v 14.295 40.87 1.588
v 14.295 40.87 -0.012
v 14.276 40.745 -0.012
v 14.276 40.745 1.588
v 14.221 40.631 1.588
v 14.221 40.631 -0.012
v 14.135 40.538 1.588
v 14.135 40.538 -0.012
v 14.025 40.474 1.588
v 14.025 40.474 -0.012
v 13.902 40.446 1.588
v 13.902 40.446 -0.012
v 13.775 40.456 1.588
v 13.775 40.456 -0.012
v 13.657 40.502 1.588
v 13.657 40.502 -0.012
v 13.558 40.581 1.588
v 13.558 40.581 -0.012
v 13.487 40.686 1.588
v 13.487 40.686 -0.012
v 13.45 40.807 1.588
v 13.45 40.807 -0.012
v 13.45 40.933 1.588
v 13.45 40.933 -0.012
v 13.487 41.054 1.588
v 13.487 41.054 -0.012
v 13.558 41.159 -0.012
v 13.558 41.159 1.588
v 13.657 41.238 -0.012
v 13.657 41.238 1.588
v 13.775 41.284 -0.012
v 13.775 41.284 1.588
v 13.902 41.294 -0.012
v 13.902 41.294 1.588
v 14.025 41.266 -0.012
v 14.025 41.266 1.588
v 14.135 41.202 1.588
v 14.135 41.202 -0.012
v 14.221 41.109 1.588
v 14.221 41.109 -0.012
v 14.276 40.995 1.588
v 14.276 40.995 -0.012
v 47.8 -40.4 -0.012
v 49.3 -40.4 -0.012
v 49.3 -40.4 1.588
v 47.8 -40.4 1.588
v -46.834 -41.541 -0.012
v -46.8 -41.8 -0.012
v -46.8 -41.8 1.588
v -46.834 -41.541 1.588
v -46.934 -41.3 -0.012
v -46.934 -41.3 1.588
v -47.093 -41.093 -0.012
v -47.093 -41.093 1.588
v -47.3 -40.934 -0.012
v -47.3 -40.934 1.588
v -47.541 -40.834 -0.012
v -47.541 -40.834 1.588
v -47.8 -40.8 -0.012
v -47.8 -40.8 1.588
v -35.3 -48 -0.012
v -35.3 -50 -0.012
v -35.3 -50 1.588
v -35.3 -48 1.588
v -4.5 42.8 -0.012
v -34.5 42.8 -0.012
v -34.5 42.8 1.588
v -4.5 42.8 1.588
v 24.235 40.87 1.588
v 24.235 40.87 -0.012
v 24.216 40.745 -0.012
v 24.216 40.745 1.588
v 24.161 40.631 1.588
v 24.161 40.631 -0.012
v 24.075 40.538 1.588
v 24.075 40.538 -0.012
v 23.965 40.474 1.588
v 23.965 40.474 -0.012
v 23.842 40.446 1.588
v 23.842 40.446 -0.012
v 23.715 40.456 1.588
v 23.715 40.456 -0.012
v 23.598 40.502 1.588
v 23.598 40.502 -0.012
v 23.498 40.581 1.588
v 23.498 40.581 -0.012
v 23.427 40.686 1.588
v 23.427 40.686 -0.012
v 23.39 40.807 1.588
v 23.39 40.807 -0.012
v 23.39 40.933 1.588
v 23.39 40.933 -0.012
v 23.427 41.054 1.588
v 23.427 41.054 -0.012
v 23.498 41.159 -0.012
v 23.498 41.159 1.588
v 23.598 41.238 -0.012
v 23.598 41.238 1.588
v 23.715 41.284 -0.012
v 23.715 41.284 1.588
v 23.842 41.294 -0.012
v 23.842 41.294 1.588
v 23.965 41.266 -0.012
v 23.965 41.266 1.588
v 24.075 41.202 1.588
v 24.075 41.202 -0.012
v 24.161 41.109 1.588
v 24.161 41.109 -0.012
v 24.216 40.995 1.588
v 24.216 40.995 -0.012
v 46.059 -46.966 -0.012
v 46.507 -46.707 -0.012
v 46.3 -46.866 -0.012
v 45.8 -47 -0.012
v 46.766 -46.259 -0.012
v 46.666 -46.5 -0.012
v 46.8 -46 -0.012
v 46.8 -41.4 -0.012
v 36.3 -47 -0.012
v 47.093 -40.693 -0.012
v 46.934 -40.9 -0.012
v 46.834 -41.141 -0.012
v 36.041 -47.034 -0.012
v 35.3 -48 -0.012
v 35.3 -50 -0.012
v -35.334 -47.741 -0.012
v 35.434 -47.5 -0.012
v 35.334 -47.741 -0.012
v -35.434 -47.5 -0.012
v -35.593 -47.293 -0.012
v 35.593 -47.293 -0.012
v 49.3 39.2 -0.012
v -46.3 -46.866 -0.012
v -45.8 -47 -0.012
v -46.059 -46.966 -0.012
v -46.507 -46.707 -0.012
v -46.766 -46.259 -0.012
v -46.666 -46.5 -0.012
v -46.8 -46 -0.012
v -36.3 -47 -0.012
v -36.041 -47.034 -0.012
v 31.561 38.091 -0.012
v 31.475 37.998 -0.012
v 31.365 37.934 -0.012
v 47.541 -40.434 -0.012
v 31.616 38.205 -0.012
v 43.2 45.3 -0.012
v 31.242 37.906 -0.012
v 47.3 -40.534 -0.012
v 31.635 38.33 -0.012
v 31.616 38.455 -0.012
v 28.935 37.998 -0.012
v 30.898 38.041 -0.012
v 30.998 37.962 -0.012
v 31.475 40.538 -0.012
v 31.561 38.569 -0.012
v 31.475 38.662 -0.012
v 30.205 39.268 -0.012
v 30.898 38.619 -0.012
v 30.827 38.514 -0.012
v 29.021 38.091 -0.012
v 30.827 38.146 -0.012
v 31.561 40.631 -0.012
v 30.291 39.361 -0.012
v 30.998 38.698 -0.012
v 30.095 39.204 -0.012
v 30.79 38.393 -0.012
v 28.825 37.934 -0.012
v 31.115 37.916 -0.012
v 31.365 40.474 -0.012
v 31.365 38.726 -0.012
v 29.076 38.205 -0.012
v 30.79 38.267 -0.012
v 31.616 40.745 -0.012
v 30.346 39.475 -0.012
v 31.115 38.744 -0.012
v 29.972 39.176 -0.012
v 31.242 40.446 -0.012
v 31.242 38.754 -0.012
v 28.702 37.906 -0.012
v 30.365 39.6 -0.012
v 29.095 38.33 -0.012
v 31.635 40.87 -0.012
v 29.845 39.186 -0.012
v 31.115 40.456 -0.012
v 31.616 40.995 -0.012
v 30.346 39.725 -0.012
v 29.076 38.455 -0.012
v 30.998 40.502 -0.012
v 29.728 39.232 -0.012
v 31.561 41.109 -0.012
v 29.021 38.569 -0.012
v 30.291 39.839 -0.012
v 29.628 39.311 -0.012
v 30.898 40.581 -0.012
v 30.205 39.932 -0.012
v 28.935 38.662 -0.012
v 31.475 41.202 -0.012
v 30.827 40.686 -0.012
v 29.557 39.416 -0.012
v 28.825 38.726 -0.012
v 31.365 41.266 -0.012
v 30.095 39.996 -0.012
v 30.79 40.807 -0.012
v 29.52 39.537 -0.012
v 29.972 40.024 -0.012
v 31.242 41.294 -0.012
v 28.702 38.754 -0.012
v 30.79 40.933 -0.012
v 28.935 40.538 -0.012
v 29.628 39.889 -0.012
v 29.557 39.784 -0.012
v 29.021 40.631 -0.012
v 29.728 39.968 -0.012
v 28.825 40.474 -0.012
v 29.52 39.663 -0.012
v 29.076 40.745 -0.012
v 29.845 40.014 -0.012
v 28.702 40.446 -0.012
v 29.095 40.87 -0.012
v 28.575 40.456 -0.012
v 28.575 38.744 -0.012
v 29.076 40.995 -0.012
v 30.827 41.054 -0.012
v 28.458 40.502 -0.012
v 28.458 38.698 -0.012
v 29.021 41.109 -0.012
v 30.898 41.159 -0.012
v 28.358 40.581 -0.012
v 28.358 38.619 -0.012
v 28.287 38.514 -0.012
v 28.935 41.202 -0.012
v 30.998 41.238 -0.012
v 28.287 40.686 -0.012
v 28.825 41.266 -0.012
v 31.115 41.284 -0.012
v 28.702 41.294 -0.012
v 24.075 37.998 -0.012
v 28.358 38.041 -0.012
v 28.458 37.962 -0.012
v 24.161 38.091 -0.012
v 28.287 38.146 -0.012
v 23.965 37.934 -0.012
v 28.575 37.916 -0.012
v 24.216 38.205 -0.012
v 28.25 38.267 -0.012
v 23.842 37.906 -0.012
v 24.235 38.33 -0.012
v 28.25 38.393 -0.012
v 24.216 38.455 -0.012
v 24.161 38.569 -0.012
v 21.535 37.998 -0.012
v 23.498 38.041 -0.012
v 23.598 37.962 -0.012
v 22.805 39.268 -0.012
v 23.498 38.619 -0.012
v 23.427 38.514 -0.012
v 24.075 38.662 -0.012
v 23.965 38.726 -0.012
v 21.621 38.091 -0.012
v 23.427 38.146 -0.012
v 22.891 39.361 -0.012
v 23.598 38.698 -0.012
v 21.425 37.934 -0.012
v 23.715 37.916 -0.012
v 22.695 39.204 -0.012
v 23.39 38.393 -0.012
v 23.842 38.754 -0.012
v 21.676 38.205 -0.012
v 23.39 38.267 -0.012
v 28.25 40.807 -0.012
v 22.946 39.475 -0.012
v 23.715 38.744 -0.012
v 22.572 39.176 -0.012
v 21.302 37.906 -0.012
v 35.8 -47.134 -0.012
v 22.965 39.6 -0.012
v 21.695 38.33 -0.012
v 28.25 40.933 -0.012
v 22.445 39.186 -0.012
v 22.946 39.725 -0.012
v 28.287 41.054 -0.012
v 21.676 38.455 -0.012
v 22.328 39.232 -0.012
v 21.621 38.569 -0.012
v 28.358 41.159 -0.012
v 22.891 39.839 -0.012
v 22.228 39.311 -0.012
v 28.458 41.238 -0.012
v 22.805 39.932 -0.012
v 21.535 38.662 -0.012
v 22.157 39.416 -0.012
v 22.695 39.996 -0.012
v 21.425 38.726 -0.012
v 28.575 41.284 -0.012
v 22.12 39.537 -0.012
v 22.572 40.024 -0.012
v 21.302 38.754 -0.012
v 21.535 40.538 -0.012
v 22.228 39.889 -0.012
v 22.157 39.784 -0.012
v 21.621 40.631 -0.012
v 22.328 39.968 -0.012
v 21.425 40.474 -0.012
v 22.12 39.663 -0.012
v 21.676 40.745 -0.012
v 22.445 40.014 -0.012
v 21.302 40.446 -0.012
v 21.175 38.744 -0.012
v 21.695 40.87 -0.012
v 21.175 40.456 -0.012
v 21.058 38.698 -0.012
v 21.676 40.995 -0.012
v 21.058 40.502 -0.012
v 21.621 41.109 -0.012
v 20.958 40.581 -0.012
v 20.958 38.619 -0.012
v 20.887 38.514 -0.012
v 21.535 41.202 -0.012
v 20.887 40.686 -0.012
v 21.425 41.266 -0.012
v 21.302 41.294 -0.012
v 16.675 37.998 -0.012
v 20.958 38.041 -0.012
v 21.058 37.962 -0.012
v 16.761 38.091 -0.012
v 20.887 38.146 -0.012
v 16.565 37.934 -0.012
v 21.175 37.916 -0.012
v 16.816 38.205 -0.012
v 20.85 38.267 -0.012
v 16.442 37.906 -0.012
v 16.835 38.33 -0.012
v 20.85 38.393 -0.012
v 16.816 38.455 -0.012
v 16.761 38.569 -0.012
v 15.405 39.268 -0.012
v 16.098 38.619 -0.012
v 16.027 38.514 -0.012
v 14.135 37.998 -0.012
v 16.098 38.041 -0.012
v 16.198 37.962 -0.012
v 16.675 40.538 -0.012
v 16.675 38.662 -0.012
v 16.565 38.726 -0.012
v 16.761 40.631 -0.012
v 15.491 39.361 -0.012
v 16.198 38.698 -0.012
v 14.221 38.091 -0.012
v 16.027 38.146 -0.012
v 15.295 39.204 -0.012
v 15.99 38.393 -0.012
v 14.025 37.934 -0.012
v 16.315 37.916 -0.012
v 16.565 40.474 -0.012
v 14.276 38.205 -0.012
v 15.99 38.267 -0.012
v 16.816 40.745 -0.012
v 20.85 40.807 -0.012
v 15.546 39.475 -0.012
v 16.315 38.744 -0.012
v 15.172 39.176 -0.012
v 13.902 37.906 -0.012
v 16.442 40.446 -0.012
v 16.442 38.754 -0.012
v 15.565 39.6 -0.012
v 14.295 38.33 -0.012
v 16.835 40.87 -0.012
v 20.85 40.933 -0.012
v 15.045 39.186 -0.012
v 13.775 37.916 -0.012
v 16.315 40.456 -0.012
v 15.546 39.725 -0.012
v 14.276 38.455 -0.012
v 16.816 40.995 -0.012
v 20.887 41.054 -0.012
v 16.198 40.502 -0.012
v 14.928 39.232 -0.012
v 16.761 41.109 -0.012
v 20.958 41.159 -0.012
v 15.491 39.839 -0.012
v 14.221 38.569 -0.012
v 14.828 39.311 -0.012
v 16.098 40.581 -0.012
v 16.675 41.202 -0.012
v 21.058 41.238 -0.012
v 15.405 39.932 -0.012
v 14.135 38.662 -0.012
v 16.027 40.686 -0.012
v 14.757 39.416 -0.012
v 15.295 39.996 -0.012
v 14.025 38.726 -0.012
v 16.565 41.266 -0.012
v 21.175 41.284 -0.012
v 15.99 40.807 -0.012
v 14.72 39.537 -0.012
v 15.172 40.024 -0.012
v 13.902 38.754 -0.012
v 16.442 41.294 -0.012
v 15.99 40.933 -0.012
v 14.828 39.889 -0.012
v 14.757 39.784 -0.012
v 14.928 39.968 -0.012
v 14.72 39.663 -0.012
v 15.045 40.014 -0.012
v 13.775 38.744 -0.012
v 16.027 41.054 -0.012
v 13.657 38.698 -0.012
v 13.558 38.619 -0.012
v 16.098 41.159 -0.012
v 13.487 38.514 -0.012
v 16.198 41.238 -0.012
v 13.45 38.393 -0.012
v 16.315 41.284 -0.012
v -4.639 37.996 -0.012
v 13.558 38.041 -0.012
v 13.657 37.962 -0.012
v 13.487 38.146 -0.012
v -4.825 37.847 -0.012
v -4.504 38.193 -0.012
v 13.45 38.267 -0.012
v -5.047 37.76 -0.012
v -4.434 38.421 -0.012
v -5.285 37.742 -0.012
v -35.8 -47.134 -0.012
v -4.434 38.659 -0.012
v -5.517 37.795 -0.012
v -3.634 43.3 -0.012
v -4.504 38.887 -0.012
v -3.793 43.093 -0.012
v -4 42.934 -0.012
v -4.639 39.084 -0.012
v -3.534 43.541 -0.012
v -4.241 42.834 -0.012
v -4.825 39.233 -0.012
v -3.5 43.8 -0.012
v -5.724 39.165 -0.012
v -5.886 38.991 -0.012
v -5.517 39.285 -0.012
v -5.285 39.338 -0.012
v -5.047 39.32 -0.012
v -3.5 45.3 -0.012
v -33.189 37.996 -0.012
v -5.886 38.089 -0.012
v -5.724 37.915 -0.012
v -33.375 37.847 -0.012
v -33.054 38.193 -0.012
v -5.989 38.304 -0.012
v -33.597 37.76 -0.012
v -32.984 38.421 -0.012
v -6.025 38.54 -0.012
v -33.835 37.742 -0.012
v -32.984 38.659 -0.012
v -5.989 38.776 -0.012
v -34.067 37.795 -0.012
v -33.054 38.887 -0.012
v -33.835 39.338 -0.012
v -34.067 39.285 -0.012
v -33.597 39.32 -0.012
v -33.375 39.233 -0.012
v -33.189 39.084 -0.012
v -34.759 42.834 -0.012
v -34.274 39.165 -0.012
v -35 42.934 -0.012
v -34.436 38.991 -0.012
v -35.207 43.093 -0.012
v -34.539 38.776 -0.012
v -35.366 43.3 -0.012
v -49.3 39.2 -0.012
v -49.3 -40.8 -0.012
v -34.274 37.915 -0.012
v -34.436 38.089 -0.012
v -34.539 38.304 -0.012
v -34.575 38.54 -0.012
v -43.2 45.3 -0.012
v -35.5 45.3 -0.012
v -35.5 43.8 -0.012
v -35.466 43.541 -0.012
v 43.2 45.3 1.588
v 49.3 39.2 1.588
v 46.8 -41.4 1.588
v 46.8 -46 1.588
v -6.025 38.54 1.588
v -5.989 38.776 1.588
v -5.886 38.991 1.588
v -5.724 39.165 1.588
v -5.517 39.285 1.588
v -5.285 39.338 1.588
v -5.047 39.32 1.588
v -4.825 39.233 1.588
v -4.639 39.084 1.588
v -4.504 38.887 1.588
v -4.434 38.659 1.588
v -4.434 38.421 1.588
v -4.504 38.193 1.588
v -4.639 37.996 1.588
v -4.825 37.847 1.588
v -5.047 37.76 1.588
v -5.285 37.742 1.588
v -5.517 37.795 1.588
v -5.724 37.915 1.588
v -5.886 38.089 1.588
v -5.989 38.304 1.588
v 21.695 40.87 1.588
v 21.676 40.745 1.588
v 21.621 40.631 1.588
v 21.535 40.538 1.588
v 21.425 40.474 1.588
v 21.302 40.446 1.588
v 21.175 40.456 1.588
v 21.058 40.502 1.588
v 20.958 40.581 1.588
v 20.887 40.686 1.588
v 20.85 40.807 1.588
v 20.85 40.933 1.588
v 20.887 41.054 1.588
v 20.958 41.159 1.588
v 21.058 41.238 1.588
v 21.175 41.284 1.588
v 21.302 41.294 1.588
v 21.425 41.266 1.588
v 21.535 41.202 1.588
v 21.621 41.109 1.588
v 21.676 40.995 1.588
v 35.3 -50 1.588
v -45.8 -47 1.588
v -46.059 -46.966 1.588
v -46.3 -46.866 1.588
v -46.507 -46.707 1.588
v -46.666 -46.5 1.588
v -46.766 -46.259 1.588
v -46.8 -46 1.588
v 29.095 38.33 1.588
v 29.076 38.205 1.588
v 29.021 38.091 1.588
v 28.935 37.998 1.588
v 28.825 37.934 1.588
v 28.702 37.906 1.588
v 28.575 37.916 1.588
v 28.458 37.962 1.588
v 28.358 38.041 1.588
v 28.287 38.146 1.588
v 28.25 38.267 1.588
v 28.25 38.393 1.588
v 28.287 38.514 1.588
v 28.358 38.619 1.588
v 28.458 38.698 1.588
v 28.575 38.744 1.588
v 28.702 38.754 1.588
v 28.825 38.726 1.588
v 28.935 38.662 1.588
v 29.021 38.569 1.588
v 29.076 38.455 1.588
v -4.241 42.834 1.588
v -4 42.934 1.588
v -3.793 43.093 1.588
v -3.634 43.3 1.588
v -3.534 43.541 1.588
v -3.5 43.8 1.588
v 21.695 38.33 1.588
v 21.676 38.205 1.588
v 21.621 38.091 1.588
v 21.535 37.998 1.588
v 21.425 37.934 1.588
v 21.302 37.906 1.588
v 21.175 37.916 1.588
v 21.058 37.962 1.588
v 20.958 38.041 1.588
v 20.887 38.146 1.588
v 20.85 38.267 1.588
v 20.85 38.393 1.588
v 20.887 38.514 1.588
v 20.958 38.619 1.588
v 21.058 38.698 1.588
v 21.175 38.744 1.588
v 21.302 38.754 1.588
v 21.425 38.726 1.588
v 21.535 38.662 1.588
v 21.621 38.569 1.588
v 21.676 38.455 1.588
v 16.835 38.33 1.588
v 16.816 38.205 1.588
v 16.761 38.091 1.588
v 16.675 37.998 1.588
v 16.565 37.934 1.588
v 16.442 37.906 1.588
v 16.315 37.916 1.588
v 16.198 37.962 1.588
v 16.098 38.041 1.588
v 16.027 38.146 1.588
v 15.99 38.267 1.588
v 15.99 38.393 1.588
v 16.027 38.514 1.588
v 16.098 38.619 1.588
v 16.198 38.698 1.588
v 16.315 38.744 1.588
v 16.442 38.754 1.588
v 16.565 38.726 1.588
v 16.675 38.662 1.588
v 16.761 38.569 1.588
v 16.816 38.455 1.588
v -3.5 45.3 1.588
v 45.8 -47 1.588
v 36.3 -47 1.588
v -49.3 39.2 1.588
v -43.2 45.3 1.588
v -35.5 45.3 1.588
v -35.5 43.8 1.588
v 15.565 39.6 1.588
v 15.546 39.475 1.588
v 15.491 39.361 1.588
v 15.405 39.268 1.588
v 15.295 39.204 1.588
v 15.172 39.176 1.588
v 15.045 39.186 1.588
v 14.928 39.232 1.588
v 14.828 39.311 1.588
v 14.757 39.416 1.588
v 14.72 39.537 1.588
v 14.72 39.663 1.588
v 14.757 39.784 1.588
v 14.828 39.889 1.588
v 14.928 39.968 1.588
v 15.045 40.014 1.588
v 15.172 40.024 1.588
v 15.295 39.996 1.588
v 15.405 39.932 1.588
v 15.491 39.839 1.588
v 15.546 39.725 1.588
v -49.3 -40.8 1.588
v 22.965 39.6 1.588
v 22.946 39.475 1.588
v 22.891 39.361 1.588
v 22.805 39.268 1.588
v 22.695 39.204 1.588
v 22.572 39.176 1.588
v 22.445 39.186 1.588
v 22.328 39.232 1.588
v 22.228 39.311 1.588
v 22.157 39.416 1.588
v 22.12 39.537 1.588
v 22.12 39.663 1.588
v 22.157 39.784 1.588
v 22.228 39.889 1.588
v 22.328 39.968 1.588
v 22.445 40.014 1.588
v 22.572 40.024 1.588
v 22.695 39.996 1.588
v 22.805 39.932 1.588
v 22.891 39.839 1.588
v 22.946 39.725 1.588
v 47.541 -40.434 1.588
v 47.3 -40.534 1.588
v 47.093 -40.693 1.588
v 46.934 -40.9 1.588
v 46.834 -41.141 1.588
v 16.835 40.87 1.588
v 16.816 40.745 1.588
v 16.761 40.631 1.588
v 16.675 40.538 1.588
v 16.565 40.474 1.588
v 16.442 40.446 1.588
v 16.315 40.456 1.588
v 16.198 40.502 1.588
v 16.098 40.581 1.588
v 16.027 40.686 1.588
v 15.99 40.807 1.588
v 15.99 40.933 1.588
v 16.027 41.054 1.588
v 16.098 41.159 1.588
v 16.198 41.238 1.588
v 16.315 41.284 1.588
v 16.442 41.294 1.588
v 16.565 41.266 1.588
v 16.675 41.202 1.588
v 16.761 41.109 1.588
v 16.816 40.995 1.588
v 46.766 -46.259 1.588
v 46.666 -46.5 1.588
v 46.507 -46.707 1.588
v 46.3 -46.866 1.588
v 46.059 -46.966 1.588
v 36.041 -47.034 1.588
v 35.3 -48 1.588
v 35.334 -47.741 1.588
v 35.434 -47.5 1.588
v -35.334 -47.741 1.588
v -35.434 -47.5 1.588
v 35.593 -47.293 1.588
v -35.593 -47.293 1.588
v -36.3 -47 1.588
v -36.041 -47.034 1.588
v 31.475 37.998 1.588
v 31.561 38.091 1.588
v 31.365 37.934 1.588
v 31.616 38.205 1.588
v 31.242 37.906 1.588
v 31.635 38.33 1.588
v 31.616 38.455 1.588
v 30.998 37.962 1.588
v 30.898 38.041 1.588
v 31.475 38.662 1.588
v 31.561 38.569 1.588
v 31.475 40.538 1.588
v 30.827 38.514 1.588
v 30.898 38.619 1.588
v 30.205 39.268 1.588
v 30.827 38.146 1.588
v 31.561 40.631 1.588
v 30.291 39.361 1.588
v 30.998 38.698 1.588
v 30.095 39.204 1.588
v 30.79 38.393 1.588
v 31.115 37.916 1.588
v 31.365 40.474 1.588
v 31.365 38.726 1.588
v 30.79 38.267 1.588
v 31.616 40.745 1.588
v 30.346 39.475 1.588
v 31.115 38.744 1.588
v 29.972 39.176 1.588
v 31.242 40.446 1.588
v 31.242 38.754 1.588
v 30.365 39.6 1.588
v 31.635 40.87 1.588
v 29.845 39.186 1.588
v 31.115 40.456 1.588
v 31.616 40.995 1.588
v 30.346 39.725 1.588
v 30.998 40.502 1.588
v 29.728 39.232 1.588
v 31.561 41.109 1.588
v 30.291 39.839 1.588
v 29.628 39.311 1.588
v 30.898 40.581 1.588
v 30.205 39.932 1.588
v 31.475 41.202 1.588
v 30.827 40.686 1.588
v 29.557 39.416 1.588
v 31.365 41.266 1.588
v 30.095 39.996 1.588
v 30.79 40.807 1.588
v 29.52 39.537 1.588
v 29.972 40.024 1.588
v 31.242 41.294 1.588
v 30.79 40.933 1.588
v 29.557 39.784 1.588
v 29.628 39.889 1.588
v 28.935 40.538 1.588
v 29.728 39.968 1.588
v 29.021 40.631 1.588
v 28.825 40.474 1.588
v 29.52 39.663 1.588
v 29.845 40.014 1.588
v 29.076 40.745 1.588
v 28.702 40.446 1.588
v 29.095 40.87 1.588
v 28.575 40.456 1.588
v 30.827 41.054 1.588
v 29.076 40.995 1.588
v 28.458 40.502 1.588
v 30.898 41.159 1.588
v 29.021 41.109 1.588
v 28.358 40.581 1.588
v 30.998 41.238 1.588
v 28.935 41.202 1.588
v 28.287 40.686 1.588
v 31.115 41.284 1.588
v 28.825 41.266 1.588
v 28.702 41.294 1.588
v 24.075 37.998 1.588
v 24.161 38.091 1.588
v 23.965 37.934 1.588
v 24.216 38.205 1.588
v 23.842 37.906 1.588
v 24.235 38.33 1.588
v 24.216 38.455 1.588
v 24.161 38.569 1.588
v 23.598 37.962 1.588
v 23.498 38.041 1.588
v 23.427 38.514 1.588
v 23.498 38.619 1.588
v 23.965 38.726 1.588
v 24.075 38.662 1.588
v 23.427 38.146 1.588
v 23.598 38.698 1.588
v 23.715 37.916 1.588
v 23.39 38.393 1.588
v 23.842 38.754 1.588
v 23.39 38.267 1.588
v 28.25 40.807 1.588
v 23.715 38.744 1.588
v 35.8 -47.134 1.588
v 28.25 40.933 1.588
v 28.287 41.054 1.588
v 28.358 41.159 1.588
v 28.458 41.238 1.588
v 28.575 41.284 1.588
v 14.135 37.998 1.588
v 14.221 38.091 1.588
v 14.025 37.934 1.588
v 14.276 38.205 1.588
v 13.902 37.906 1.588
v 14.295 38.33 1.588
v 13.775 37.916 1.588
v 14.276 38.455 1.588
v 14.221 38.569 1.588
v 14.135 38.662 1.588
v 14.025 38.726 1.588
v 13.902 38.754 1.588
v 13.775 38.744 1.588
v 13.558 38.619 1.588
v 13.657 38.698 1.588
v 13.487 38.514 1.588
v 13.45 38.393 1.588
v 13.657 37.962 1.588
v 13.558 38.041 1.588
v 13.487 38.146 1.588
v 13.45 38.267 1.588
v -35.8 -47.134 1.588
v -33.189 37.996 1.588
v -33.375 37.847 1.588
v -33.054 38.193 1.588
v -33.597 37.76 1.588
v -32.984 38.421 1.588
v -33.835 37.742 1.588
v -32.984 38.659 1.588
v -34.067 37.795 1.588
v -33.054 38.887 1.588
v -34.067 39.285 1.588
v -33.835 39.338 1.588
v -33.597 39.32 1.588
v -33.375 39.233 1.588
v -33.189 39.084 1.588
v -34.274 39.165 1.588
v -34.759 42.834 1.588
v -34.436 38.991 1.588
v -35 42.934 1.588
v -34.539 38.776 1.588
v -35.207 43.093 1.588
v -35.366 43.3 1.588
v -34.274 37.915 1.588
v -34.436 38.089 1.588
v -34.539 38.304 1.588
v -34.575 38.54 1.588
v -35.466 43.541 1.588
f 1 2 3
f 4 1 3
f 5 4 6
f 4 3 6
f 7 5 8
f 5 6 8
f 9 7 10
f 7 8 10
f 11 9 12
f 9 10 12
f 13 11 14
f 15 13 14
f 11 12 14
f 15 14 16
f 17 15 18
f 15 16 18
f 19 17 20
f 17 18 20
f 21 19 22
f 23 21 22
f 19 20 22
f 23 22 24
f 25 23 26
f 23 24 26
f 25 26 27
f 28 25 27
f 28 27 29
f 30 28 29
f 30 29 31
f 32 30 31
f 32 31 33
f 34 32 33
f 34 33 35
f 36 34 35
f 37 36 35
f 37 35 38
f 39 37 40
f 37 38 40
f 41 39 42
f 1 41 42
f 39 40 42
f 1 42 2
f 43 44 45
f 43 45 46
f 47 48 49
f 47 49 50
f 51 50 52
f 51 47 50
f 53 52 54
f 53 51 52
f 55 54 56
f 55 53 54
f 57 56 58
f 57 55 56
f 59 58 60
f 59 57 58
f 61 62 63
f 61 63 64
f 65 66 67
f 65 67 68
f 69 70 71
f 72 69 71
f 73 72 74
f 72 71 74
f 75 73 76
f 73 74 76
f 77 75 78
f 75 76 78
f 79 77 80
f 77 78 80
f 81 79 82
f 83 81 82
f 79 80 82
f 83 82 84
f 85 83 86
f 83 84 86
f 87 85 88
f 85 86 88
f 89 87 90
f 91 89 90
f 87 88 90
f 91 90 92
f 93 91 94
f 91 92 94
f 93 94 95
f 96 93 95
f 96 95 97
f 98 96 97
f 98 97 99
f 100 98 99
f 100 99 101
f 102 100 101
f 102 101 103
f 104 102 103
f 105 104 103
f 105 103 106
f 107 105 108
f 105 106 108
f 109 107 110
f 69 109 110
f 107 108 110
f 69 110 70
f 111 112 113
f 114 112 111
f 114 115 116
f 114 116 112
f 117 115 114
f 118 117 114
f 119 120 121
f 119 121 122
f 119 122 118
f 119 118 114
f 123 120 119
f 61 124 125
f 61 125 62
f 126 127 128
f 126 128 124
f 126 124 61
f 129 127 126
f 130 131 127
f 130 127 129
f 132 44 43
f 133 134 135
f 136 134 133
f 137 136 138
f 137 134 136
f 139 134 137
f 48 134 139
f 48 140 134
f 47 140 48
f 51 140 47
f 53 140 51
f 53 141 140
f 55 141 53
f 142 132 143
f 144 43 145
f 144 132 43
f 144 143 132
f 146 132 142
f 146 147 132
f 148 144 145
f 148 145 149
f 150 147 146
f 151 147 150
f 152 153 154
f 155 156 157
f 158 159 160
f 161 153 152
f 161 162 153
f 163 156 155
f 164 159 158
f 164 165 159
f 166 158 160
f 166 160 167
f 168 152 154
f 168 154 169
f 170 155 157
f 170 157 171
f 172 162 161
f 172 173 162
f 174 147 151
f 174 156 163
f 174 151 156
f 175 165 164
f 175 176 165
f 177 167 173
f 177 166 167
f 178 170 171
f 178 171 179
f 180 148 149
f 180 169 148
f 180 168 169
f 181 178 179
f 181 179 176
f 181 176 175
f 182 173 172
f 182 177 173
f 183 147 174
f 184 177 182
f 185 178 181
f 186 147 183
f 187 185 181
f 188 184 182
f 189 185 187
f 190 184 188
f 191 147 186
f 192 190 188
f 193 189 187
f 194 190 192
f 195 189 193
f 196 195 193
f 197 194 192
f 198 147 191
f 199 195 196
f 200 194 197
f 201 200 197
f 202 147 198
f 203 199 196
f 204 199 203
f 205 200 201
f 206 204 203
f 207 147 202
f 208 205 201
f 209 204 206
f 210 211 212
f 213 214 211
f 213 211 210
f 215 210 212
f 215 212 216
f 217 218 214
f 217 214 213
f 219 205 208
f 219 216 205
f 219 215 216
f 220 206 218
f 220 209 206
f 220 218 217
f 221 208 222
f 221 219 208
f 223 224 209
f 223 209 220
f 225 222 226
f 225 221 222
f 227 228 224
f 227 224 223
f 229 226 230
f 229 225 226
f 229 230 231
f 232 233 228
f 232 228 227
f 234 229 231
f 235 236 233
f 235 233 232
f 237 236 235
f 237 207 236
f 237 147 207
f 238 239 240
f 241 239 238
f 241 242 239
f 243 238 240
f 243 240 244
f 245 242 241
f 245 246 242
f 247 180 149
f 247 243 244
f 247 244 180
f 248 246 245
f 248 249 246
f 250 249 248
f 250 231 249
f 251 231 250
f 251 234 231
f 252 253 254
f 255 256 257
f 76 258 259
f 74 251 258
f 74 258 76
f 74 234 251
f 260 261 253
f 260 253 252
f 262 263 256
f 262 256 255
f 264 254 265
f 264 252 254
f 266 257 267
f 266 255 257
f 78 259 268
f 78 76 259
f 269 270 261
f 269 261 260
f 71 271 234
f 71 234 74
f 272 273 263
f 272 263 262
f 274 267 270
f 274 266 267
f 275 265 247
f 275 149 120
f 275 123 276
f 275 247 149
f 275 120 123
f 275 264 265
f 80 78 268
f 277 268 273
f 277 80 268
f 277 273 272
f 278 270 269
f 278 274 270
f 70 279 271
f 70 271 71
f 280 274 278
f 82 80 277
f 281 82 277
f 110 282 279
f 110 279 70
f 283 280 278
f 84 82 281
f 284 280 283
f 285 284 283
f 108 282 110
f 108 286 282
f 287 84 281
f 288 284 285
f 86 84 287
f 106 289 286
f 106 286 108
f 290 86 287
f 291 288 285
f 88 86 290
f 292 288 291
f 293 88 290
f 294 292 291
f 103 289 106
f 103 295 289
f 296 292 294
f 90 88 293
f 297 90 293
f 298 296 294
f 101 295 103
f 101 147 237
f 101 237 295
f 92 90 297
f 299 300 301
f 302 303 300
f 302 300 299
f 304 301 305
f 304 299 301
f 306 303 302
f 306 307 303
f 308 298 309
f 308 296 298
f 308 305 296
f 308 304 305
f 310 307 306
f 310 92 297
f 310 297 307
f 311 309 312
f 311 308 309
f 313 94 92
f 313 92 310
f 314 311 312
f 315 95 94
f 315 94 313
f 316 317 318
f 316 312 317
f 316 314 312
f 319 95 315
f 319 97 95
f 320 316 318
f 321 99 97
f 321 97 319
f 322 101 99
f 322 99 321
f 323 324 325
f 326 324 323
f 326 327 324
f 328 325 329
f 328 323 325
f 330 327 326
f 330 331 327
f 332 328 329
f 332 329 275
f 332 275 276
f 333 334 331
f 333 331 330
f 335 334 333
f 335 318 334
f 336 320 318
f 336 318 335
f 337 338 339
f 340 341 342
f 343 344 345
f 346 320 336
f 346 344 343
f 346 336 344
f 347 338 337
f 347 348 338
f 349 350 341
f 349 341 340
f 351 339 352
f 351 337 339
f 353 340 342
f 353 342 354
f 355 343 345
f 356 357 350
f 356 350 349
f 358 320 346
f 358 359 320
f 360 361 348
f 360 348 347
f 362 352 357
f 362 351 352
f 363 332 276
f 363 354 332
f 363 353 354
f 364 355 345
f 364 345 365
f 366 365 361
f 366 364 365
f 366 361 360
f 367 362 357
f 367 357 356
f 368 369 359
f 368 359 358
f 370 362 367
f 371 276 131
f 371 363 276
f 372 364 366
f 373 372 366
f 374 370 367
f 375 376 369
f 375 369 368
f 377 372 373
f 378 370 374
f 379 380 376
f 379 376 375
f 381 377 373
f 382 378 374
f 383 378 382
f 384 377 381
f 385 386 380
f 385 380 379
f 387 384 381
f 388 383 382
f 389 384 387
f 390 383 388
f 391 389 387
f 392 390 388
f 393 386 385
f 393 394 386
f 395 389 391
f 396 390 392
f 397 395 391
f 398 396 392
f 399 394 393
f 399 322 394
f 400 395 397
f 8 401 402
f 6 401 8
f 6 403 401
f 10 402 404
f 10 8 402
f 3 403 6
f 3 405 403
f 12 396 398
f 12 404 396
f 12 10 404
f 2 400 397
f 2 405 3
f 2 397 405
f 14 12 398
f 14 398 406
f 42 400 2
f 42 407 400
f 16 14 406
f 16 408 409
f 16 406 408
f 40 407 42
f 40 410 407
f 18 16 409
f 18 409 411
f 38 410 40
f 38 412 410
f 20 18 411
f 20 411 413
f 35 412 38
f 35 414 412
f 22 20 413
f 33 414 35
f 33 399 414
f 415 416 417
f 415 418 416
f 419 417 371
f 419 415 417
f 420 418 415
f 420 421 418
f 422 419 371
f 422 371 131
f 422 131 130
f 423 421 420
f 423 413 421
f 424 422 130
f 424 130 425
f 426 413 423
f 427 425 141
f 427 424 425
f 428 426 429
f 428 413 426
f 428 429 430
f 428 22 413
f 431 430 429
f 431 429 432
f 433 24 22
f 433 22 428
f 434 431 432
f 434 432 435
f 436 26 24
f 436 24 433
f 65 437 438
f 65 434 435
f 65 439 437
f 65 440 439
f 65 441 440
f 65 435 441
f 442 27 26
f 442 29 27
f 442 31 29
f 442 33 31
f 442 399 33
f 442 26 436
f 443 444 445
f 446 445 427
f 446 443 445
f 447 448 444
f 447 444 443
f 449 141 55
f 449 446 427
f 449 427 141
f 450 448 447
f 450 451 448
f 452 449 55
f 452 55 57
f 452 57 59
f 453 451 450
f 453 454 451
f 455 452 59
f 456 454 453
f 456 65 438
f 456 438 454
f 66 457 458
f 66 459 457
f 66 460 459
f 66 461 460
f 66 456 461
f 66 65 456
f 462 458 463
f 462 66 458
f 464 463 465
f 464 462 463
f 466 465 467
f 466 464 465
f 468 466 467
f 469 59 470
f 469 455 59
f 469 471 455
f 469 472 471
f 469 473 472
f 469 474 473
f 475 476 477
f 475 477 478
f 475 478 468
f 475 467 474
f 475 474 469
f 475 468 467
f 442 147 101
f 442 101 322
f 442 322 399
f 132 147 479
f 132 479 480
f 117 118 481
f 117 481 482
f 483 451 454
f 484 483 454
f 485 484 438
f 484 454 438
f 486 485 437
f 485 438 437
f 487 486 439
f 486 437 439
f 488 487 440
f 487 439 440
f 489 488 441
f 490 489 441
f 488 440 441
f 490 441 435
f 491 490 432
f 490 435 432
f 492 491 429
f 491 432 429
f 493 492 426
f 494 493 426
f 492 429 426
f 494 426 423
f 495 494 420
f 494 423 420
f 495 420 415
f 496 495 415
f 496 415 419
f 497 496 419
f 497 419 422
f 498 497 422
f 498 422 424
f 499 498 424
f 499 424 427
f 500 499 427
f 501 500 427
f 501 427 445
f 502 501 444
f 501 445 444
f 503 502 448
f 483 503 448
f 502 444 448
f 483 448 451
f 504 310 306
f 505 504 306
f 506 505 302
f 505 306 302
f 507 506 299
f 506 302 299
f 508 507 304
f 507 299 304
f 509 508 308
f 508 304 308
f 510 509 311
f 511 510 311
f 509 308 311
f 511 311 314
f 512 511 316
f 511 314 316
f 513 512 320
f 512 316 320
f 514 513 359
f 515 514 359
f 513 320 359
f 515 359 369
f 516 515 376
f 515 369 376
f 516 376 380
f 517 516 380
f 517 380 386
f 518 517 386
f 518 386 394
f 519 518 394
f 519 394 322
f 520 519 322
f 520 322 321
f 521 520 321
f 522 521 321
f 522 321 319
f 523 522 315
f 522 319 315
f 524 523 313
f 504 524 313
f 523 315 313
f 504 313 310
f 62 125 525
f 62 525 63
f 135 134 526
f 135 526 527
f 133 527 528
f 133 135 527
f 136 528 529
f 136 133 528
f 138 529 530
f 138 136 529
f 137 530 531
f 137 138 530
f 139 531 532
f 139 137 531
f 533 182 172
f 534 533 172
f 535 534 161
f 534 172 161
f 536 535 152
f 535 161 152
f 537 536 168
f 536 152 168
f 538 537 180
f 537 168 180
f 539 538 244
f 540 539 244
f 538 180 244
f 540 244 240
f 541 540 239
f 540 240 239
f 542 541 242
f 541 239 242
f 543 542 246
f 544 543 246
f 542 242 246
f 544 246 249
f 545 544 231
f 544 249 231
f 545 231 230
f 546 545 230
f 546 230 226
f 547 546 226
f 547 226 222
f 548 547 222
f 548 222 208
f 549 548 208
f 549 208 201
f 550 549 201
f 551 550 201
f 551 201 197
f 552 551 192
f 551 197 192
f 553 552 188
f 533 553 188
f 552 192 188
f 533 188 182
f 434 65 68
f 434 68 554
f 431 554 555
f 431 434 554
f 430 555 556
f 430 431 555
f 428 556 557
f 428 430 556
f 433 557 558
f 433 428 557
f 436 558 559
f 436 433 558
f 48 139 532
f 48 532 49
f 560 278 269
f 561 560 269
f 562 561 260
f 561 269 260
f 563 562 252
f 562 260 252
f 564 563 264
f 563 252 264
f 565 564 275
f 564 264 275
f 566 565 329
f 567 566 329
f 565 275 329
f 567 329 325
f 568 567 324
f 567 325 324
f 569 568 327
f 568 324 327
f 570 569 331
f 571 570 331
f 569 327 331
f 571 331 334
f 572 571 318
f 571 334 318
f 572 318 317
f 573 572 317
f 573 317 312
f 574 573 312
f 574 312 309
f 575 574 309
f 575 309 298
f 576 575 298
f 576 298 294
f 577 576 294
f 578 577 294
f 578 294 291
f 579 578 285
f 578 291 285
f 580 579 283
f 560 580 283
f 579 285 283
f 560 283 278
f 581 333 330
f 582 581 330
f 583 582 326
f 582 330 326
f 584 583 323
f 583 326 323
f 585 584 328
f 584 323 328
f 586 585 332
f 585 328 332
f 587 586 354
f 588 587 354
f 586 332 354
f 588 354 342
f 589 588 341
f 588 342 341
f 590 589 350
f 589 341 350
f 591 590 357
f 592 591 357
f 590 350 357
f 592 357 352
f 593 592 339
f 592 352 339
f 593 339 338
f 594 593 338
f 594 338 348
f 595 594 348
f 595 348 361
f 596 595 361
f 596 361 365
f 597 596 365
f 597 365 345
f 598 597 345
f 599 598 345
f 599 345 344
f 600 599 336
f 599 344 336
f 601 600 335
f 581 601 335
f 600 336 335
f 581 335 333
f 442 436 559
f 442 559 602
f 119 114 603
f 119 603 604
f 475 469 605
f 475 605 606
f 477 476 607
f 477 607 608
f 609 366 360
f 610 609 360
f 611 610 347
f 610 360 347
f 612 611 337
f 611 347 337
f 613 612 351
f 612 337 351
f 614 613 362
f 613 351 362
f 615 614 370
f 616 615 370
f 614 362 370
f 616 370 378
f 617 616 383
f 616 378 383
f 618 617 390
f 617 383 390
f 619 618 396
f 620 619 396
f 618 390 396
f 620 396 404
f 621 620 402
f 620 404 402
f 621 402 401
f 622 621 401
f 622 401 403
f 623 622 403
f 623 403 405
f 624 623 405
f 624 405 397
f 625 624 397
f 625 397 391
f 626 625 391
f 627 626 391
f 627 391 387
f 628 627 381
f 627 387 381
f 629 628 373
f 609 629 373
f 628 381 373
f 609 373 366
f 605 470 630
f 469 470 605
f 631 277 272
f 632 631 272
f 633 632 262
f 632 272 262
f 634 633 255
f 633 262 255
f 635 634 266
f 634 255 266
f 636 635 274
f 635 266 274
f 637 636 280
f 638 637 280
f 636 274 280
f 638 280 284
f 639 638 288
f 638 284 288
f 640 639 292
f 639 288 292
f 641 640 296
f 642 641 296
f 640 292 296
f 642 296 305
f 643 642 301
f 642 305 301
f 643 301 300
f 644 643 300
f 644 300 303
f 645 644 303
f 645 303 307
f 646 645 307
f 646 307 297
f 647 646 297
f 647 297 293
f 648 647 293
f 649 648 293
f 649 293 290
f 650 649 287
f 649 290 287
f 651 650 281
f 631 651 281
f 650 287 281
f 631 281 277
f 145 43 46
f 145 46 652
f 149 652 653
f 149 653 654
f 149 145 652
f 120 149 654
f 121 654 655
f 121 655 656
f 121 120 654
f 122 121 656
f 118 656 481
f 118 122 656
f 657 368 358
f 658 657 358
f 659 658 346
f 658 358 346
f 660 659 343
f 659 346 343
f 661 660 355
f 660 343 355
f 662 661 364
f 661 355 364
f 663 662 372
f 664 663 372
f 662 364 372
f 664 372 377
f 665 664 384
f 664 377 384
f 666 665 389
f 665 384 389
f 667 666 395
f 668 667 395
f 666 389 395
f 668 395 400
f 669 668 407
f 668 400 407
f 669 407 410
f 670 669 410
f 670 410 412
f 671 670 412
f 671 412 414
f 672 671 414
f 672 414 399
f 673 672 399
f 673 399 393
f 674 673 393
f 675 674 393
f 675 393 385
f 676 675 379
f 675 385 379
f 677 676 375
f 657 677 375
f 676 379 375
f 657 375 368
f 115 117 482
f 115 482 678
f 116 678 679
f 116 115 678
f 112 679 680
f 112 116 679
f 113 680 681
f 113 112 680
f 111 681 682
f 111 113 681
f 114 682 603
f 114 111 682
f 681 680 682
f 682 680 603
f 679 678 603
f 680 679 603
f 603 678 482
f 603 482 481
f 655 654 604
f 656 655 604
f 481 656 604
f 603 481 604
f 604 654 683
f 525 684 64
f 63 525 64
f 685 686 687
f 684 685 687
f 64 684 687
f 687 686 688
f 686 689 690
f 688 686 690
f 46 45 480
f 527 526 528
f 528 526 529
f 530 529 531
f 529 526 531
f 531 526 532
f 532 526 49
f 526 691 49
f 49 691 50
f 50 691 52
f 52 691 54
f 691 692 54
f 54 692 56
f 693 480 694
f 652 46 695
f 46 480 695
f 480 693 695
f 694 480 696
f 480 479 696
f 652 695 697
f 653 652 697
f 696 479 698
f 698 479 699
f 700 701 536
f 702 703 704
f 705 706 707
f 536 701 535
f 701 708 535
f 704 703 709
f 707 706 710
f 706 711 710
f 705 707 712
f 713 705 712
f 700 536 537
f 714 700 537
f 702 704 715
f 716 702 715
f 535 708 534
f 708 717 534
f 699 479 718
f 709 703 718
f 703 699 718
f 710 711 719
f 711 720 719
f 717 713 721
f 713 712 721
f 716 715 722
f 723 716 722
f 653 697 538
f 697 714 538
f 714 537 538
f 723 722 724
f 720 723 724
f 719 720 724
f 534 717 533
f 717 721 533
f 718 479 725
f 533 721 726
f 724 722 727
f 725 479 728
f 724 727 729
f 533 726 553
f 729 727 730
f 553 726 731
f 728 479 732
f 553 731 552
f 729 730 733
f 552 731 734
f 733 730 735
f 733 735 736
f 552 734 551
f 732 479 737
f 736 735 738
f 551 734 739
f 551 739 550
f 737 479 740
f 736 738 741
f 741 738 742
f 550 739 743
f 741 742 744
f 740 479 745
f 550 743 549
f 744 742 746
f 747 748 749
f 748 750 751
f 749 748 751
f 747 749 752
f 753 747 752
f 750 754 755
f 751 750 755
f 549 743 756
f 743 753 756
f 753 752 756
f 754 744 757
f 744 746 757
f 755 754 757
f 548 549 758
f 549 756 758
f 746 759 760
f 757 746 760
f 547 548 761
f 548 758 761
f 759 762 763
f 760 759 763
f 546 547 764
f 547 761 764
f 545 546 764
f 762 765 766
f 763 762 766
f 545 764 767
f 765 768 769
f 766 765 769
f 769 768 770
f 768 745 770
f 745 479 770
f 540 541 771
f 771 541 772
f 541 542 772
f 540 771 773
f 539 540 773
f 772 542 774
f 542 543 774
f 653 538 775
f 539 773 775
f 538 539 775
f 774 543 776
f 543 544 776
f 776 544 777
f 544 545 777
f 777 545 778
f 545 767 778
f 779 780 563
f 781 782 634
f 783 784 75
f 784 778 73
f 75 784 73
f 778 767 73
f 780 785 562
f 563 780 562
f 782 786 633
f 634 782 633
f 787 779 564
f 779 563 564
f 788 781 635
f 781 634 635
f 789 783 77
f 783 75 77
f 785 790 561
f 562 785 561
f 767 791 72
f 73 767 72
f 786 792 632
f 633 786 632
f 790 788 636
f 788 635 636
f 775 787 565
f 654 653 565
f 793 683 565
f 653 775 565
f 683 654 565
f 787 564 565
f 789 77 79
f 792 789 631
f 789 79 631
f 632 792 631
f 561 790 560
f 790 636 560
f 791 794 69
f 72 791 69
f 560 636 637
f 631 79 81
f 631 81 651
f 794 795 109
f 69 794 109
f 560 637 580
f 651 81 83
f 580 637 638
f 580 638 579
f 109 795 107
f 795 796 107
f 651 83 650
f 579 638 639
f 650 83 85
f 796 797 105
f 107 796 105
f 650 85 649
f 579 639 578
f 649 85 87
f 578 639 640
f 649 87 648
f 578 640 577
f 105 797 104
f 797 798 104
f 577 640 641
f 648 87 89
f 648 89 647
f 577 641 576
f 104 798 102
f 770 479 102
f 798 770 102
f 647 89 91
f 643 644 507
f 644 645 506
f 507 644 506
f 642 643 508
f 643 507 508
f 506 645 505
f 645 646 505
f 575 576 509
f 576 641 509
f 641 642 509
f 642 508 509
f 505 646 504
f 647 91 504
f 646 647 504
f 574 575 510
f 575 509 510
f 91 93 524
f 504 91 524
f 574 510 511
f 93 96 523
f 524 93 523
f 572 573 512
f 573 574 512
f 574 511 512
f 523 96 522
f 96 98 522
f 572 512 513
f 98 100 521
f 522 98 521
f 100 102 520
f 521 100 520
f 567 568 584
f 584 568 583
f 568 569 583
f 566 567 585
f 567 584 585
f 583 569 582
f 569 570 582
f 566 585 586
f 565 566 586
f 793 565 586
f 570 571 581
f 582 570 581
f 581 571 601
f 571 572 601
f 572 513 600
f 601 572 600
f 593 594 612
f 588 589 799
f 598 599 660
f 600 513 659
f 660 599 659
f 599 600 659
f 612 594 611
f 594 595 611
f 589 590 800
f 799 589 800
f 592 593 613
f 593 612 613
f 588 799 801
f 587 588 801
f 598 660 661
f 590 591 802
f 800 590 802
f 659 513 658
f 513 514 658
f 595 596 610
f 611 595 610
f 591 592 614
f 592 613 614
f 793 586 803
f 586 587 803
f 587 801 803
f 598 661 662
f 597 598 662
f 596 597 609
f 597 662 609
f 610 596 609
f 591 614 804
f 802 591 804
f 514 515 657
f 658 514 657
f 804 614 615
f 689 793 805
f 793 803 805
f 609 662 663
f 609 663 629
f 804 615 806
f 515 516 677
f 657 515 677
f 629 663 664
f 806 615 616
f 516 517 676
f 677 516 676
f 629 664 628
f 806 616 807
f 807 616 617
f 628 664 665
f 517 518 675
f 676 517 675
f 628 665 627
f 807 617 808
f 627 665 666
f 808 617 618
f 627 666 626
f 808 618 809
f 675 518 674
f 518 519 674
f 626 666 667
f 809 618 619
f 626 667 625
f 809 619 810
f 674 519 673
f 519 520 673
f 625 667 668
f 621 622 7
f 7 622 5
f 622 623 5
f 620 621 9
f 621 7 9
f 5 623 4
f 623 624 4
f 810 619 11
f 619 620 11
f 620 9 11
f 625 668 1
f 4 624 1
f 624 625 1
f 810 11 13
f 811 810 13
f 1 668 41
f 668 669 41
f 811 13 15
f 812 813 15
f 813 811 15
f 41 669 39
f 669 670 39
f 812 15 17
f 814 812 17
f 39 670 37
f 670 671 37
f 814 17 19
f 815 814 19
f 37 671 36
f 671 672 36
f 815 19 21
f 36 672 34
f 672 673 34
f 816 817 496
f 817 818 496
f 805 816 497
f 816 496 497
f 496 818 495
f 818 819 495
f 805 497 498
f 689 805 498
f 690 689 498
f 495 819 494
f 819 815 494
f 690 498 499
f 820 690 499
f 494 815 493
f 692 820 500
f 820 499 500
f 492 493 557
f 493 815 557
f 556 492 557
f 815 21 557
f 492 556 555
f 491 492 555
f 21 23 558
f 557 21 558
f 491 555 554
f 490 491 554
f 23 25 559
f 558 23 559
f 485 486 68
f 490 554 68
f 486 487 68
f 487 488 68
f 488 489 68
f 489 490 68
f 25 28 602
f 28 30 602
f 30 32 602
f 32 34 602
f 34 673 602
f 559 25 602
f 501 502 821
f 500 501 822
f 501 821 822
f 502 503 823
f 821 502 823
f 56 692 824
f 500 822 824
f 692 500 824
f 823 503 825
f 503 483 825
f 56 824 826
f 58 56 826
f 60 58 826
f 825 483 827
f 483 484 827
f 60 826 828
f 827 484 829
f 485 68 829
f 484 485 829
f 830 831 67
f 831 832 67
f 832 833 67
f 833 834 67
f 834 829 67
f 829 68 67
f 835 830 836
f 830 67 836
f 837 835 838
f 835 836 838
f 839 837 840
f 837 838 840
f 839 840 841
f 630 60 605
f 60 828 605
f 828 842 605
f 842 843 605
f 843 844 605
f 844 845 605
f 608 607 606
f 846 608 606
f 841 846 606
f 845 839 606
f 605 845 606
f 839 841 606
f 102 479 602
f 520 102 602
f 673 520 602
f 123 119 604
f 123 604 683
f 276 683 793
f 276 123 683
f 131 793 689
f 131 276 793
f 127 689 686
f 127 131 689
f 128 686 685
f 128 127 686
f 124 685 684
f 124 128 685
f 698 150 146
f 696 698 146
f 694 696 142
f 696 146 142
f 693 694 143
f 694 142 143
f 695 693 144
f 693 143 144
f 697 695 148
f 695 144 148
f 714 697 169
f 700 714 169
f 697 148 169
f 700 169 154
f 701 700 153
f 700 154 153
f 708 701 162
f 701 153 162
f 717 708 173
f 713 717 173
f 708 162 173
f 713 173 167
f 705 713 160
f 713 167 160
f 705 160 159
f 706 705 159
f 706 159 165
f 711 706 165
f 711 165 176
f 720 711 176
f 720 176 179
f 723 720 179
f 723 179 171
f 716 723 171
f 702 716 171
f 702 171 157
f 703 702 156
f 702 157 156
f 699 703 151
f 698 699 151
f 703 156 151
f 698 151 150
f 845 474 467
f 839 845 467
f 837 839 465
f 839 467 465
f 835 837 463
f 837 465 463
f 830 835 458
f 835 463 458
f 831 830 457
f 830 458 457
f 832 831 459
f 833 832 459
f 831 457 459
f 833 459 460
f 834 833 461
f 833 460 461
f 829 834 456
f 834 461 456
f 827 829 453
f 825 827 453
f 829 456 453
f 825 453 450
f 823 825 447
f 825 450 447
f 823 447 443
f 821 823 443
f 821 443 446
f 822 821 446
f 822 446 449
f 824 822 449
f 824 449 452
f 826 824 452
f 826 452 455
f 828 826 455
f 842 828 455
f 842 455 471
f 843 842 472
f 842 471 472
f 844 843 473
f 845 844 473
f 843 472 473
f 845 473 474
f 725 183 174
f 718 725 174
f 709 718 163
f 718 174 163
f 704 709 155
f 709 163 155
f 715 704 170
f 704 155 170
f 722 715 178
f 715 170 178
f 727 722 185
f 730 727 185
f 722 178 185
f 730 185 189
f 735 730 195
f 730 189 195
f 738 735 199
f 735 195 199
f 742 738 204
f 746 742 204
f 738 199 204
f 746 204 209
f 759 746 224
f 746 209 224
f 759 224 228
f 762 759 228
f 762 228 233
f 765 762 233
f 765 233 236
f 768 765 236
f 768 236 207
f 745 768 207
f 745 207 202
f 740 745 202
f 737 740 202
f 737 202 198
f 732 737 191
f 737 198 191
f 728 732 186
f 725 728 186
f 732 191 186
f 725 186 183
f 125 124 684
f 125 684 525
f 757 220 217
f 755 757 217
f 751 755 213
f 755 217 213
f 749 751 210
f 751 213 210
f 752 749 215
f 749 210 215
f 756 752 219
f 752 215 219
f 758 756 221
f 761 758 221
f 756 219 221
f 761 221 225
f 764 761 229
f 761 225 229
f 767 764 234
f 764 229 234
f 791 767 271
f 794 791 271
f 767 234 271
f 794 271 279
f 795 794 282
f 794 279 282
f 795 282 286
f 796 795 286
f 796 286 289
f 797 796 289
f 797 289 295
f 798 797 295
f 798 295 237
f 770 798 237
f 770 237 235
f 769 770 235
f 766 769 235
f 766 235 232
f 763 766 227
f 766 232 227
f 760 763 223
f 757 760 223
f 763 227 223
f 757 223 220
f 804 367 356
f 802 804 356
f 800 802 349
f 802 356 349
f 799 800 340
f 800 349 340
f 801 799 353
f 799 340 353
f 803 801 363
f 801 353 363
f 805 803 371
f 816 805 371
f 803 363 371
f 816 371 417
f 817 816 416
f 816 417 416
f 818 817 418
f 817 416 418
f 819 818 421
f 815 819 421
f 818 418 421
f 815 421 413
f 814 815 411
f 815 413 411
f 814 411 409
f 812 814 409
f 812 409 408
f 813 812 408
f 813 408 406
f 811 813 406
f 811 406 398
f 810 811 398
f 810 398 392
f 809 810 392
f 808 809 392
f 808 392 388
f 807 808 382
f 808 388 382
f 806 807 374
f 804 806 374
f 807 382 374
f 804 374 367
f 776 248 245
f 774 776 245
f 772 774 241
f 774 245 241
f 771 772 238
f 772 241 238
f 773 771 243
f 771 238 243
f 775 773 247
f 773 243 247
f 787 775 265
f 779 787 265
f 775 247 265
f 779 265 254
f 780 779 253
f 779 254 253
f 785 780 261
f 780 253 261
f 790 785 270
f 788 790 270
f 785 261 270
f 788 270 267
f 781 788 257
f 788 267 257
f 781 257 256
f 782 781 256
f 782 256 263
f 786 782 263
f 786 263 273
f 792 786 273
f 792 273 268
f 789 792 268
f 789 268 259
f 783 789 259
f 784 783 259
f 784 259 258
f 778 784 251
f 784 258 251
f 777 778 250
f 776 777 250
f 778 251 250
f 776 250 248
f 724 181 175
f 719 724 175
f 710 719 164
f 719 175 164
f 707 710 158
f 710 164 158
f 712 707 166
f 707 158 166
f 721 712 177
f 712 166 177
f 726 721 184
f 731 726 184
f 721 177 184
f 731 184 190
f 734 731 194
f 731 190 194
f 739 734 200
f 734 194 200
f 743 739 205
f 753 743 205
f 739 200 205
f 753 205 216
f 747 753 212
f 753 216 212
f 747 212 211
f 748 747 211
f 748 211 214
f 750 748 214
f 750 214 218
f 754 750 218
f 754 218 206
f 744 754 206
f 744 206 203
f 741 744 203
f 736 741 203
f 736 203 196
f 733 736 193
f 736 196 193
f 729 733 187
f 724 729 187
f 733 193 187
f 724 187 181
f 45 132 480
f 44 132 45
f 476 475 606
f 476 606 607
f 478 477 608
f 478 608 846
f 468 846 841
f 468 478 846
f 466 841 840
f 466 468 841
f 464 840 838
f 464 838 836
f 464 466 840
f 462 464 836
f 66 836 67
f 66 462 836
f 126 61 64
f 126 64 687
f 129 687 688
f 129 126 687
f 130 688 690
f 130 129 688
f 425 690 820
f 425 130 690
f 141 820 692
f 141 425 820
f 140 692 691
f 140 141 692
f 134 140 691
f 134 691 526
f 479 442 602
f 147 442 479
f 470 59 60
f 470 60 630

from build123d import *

# Parameters (mm, degrees)
SKETCH1_R           = 0.425
SKETCH1_R_2         = 0.8
BOSS_EXTRUDE1_DEPTH = 1.6


with BuildPart() as part:
    # Sketch1 → Boss-Extrude1 (new body)
    with BuildSketch(Plane(origin=(0, 0, -0.0125), x_dir=(-1, 0, 0), z_dir=(0, 0, -1))):
        with BuildLine():
            Line((47.8, -40.8), (49.3, -40.8))
            Line((49.3, -40.8), (49.3, 39.2))
            Line((49.3, 39.2), (43.2, 45.3))
            Line((43.2, 45.3), (35.500000017, 45.3))
            Line((35.500000017, 45.3), (35.500000017, 43.8))
            ThreePointArc((35.500000017, 43.8), (35.207106799, 43.092893219), (34.500000017, 42.8))
            Line((34.500000017, 42.8), (4.500000014, 42.8))
            ThreePointArc((4.500000014, 42.8), (3.792893232, 43.092893219), (3.500000014, 43.8))
            Line((3.500000014, 43.8), (3.500000014, 45.3))
            Line((3.500000014, 45.3), (-43.2, 45.3))
            Line((-43.2, 45.3), (-49.3, 39.2))
            Line((-49.3, 39.2), (-49.3, -40.4))
            Line((-49.3, -40.4), (-47.8, -40.4))
            ThreePointArc((-47.8, -40.4), (-47.092893219, -40.692893219), (-46.8, -41.4))
            Line((-46.8, -41.4), (-46.8, -46))
            ThreePointArc((-46.8, -46), (-46.507106781, -46.707106781), (-45.8, -47))
            Line((-45.8, -47), (-36.3, -47))
            ThreePointArc((-36.3, -47), (-35.592893219, -47.292893219), (-35.3, -48))
            Line((-35.3, -48), (-35.3, -50))
            Line((-35.3, -50), (35.3, -50))
            Line((35.3, -50), (35.3, -48))
            ThreePointArc((35.3, -48), (35.592893219, -47.292893219), (36.3, -47))
            Line((36.3, -47), (45.8, -47))
            ThreePointArc((45.8, -47), (46.507106781, -46.707106781), (46.8, -46))
            Line((46.8, -46), (46.8, -41.8))
            ThreePointArc((46.8, -41.8), (47.092893219, -41.092893219), (47.8, -40.8))
        make_face()
        with Locations(Location((-13.87, 38.33, 0), (0, 0, 180))):
            Circle(SKETCH1_R, mode=Mode.SUBTRACT)
        with Locations(Location((-22.54, 39.6, 0), (0, 0, 180))):
            Circle(SKETCH1_R, mode=Mode.SUBTRACT)
        with Locations(Location((-23.81, 40.87, 0), (0, 0, 180))):
            Circle(SKETCH1_R, mode=Mode.SUBTRACT)
        with Locations(Location((-21.27, 40.87, 0), (0, 0, 180))):
            Circle(SKETCH1_R, mode=Mode.SUBTRACT)
        with Locations(Location((-13.87, 40.87, 0), (0, 0, 180))):
            Circle(SKETCH1_R, mode=Mode.SUBTRACT)
        with Locations(Location((-31.21, 40.87, 0), (0, 0, 180))):
            Circle(SKETCH1_R, mode=Mode.SUBTRACT)
        with Locations(Location((-16.41, 40.87, 0), (0, 0, 180))):
            Circle(SKETCH1_R, mode=Mode.SUBTRACT)
        with Locations(Location((-15.14, 39.6, 0), (0, 0, 180))):
            Circle(SKETCH1_R, mode=Mode.SUBTRACT)
        with Locations(Location((-29.94, 39.6, 0), (0, 0, 180))):
            Circle(SKETCH1_R, mode=Mode.SUBTRACT)
        with Locations(Location((-28.67, 40.87, 0), (0, 0, 180))):
            Circle(SKETCH1_R, mode=Mode.SUBTRACT)
        with Locations(Location((-28.67, 38.33, 0), (0, 0, 180))):
            Circle(SKETCH1_R, mode=Mode.SUBTRACT)
        with Locations(Location((-16.41, 38.33, 0), (0, 0, 180))):
            Circle(SKETCH1_R, mode=Mode.SUBTRACT)
        with Locations(Location((-21.27, 38.33, 0), (0, 0, 180))):
            Circle(SKETCH1_R, mode=Mode.SUBTRACT)
        with Locations(Location((-23.81, 38.33, 0), (0, 0, 180))):
            Circle(SKETCH1_R, mode=Mode.SUBTRACT)
        with Locations(Location((-31.21, 38.33, 0), (0, 0, 180))):
            Circle(SKETCH1_R, mode=Mode.SUBTRACT)
        with Locations((33.775, 38.54)):
            Circle(SKETCH1_R_2, mode=Mode.SUBTRACT)
        with Locations((5.225, 38.54)):
            Circle(SKETCH1_R_2, mode=Mode.SUBTRACT)
    extrude(amount=-BOSS_EXTRUDE1_DEPTH)


solid = part.part
